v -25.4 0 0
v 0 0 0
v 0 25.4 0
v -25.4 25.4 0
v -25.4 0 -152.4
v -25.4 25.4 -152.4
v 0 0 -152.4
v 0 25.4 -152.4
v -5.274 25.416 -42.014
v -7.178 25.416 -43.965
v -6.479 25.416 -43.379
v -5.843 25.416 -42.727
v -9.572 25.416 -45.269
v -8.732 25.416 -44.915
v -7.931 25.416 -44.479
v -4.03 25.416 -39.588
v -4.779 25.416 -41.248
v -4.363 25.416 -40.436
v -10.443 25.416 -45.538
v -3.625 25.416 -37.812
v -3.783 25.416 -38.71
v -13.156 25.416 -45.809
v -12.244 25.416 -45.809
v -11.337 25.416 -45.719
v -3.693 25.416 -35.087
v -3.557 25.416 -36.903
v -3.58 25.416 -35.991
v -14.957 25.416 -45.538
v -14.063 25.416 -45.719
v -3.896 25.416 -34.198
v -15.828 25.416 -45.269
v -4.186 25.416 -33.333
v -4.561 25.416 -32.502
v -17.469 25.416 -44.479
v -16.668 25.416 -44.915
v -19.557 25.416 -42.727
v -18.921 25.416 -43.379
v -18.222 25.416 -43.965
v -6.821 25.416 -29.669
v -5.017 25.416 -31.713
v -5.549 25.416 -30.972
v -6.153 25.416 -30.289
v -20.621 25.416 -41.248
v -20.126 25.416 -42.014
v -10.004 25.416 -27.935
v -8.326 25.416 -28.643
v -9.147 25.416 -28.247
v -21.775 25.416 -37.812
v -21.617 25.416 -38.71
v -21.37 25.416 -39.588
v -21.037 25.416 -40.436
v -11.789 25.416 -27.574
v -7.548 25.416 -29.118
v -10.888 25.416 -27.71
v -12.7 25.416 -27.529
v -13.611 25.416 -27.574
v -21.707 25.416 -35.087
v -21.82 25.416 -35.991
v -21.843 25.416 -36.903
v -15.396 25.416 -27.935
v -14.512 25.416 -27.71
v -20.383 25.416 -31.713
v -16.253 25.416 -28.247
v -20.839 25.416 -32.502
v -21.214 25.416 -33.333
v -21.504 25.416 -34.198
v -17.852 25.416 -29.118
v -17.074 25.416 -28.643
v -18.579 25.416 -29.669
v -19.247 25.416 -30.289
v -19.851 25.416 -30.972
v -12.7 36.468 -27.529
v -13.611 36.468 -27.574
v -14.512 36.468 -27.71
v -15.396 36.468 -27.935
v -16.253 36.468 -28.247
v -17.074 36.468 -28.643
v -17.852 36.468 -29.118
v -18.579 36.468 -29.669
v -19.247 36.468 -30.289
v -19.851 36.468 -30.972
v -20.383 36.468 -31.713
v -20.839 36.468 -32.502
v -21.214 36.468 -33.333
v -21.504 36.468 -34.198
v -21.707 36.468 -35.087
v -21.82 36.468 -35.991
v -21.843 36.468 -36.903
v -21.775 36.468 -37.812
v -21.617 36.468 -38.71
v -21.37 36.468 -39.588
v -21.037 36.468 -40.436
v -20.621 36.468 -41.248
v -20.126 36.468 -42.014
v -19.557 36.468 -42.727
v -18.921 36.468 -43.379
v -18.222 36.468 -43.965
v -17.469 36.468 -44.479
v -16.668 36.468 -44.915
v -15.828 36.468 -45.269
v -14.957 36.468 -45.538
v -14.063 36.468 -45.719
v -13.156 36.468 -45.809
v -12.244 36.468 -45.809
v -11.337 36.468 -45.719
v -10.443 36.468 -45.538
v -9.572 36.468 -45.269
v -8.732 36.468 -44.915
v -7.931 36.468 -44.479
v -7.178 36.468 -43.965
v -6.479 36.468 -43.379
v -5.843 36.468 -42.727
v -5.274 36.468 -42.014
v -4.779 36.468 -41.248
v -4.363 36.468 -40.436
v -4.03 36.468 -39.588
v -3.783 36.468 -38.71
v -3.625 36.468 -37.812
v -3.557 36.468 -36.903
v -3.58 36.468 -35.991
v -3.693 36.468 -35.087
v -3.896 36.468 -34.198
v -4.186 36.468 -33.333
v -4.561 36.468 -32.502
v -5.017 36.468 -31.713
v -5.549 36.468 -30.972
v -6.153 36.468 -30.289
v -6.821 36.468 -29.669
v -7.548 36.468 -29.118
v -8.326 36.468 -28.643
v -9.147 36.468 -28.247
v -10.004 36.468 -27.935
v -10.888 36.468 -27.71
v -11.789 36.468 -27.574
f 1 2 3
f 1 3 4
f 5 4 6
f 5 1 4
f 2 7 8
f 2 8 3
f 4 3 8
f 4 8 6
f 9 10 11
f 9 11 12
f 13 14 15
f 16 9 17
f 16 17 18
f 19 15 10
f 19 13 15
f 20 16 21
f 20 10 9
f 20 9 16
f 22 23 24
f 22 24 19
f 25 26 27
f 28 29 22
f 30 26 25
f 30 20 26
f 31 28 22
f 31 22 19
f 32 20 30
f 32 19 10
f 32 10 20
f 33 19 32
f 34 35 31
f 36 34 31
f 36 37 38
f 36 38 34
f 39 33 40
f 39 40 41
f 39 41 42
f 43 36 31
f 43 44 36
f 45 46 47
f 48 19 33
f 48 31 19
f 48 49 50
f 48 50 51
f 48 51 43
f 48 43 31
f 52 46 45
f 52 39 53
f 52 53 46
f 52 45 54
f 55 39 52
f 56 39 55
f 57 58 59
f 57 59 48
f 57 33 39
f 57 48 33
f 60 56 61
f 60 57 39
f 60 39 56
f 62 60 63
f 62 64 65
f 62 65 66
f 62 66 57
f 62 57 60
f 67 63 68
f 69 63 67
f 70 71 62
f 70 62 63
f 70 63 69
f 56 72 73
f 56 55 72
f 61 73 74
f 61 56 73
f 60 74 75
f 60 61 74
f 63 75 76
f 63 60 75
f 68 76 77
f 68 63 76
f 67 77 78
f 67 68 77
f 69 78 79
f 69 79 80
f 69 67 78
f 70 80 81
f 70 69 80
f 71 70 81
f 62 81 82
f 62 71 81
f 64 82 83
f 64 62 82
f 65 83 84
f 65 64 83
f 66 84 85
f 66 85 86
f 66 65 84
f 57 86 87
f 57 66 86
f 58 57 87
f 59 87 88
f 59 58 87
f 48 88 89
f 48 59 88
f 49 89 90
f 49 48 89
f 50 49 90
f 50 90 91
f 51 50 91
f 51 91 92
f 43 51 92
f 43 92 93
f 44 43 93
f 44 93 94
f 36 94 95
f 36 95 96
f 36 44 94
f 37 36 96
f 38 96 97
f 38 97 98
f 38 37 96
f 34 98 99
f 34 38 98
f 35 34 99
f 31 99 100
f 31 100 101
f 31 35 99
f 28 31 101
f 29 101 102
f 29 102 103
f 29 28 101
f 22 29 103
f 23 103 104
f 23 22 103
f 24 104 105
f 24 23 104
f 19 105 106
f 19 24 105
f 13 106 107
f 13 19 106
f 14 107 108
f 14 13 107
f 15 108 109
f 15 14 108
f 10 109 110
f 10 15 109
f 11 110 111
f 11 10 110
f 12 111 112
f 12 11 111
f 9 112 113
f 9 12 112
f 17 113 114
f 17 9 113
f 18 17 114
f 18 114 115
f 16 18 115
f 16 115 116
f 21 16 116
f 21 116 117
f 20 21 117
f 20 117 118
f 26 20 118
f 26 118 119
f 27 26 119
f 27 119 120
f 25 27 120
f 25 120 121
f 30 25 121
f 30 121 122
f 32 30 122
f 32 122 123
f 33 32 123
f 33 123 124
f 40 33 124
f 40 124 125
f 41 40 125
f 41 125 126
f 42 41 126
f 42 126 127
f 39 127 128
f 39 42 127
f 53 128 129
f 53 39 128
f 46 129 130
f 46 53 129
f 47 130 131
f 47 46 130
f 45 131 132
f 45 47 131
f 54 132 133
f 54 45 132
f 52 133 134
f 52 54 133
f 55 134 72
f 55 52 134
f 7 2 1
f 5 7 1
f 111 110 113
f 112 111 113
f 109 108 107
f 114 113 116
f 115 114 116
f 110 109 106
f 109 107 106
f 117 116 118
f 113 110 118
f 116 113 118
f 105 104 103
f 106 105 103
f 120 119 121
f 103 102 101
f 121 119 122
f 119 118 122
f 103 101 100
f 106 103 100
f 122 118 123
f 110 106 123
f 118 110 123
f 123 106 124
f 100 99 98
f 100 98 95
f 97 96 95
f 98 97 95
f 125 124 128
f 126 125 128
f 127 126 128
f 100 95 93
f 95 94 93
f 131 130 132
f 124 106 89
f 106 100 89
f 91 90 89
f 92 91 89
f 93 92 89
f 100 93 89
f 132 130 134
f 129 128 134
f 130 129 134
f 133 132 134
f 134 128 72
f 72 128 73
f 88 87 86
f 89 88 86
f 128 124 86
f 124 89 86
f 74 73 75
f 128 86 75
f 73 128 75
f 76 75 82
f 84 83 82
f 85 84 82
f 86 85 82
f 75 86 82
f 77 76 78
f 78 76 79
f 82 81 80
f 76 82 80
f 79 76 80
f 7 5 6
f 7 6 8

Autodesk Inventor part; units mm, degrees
ref_plane "YZ Plane" through (0, 0, 0) normal (1, 0, 0) x (0, 1, 0)
ref_plane "XZ Plane" through (0, 0, 0) normal (0, 1, 0) x (-1, 0, 0)
sketch "Sketch1" plane through (0, 0, 0) normal (0, 1, 0) x (-1, 0, 0)
  line L0 (0, 0) -> (25.4, 0)
  line L1 (25.4, 0) -> (25.4, -152.4)
  line L2 (25.4, -152.4) -> (0, -152.4)
  line L3 (0, -152.4) -> (0, 0)
  dimension "d0" = 25.4
  dimension "d2" = 152.4
extrude "Extrusion1" add sketch "Sketch1" along normal blind 25.4
sketch "Sketch2" plane through (0, 25.4, 0) normal (0, 1, 0) x (1, 0, 0)
  circle A0 centre (-12.7, 38.1) radius 9.525
  circle A1 centre (-12.7, 114.3) radius 9.525
  line L0 (0, 0) -> (0, 152.4) projected
  line L1 (0, 0) -> (0, 152.4)
  line L2 (-25.4, 0) -> (0, 0) projected
  line L3 (0, 152.4) -> (-25.4, 152.4) projected
  point P0 (-12.7, 0)
  point P1 (-12.7, 152.4)
  dimension "d5" = 19.05
  dimension "d6" = 19.05
  dimension "d7" = 38.1
  dimension "d8" = 38.1
ref_plane "Work Plane2" through (-12.7, 25.4, 0) normal (1, 0, 0) x (0, 0, -1)
sketch "Sketch3" plane through (-12.7, 25.4, 0) normal (1, 0, 0) x (0, 0, -1)
  line L0 (0, 0) -> (152.4, 0) projected
  line L1 (37.8661, 0) -> (50.5661, 0)
  line L2 (113.6104, 0) -> (113.6104, 12.7)
  point P0 (0, -25.4)
  dimension "d11" = 12.7
  dimension "d12" = 12.7
sketch "Sketch4" plane through (-12.7, 25.4, 0) normal (1, 0, 0) x (0, 0, -1)
  line L0 (27.5288, 0.0165) -> (36.6748, 0.0165)
  line L1 (36.6748, 0.0165) -> (36.6748, 11.0679)
  line L2 (36.6748, 11.0679) -> (27.5288, 11.0679)
  line L3 (27.5288, 11.0679) -> (27.5288, 0.0165)
  point P0 (0, -25.4)
revolve "Revolution1" add sketch "Sketch4" angle 360 about axis through (-12.7, 25.4165, -36.6748) along (0, -1, 0)
properties part number "Lego"
